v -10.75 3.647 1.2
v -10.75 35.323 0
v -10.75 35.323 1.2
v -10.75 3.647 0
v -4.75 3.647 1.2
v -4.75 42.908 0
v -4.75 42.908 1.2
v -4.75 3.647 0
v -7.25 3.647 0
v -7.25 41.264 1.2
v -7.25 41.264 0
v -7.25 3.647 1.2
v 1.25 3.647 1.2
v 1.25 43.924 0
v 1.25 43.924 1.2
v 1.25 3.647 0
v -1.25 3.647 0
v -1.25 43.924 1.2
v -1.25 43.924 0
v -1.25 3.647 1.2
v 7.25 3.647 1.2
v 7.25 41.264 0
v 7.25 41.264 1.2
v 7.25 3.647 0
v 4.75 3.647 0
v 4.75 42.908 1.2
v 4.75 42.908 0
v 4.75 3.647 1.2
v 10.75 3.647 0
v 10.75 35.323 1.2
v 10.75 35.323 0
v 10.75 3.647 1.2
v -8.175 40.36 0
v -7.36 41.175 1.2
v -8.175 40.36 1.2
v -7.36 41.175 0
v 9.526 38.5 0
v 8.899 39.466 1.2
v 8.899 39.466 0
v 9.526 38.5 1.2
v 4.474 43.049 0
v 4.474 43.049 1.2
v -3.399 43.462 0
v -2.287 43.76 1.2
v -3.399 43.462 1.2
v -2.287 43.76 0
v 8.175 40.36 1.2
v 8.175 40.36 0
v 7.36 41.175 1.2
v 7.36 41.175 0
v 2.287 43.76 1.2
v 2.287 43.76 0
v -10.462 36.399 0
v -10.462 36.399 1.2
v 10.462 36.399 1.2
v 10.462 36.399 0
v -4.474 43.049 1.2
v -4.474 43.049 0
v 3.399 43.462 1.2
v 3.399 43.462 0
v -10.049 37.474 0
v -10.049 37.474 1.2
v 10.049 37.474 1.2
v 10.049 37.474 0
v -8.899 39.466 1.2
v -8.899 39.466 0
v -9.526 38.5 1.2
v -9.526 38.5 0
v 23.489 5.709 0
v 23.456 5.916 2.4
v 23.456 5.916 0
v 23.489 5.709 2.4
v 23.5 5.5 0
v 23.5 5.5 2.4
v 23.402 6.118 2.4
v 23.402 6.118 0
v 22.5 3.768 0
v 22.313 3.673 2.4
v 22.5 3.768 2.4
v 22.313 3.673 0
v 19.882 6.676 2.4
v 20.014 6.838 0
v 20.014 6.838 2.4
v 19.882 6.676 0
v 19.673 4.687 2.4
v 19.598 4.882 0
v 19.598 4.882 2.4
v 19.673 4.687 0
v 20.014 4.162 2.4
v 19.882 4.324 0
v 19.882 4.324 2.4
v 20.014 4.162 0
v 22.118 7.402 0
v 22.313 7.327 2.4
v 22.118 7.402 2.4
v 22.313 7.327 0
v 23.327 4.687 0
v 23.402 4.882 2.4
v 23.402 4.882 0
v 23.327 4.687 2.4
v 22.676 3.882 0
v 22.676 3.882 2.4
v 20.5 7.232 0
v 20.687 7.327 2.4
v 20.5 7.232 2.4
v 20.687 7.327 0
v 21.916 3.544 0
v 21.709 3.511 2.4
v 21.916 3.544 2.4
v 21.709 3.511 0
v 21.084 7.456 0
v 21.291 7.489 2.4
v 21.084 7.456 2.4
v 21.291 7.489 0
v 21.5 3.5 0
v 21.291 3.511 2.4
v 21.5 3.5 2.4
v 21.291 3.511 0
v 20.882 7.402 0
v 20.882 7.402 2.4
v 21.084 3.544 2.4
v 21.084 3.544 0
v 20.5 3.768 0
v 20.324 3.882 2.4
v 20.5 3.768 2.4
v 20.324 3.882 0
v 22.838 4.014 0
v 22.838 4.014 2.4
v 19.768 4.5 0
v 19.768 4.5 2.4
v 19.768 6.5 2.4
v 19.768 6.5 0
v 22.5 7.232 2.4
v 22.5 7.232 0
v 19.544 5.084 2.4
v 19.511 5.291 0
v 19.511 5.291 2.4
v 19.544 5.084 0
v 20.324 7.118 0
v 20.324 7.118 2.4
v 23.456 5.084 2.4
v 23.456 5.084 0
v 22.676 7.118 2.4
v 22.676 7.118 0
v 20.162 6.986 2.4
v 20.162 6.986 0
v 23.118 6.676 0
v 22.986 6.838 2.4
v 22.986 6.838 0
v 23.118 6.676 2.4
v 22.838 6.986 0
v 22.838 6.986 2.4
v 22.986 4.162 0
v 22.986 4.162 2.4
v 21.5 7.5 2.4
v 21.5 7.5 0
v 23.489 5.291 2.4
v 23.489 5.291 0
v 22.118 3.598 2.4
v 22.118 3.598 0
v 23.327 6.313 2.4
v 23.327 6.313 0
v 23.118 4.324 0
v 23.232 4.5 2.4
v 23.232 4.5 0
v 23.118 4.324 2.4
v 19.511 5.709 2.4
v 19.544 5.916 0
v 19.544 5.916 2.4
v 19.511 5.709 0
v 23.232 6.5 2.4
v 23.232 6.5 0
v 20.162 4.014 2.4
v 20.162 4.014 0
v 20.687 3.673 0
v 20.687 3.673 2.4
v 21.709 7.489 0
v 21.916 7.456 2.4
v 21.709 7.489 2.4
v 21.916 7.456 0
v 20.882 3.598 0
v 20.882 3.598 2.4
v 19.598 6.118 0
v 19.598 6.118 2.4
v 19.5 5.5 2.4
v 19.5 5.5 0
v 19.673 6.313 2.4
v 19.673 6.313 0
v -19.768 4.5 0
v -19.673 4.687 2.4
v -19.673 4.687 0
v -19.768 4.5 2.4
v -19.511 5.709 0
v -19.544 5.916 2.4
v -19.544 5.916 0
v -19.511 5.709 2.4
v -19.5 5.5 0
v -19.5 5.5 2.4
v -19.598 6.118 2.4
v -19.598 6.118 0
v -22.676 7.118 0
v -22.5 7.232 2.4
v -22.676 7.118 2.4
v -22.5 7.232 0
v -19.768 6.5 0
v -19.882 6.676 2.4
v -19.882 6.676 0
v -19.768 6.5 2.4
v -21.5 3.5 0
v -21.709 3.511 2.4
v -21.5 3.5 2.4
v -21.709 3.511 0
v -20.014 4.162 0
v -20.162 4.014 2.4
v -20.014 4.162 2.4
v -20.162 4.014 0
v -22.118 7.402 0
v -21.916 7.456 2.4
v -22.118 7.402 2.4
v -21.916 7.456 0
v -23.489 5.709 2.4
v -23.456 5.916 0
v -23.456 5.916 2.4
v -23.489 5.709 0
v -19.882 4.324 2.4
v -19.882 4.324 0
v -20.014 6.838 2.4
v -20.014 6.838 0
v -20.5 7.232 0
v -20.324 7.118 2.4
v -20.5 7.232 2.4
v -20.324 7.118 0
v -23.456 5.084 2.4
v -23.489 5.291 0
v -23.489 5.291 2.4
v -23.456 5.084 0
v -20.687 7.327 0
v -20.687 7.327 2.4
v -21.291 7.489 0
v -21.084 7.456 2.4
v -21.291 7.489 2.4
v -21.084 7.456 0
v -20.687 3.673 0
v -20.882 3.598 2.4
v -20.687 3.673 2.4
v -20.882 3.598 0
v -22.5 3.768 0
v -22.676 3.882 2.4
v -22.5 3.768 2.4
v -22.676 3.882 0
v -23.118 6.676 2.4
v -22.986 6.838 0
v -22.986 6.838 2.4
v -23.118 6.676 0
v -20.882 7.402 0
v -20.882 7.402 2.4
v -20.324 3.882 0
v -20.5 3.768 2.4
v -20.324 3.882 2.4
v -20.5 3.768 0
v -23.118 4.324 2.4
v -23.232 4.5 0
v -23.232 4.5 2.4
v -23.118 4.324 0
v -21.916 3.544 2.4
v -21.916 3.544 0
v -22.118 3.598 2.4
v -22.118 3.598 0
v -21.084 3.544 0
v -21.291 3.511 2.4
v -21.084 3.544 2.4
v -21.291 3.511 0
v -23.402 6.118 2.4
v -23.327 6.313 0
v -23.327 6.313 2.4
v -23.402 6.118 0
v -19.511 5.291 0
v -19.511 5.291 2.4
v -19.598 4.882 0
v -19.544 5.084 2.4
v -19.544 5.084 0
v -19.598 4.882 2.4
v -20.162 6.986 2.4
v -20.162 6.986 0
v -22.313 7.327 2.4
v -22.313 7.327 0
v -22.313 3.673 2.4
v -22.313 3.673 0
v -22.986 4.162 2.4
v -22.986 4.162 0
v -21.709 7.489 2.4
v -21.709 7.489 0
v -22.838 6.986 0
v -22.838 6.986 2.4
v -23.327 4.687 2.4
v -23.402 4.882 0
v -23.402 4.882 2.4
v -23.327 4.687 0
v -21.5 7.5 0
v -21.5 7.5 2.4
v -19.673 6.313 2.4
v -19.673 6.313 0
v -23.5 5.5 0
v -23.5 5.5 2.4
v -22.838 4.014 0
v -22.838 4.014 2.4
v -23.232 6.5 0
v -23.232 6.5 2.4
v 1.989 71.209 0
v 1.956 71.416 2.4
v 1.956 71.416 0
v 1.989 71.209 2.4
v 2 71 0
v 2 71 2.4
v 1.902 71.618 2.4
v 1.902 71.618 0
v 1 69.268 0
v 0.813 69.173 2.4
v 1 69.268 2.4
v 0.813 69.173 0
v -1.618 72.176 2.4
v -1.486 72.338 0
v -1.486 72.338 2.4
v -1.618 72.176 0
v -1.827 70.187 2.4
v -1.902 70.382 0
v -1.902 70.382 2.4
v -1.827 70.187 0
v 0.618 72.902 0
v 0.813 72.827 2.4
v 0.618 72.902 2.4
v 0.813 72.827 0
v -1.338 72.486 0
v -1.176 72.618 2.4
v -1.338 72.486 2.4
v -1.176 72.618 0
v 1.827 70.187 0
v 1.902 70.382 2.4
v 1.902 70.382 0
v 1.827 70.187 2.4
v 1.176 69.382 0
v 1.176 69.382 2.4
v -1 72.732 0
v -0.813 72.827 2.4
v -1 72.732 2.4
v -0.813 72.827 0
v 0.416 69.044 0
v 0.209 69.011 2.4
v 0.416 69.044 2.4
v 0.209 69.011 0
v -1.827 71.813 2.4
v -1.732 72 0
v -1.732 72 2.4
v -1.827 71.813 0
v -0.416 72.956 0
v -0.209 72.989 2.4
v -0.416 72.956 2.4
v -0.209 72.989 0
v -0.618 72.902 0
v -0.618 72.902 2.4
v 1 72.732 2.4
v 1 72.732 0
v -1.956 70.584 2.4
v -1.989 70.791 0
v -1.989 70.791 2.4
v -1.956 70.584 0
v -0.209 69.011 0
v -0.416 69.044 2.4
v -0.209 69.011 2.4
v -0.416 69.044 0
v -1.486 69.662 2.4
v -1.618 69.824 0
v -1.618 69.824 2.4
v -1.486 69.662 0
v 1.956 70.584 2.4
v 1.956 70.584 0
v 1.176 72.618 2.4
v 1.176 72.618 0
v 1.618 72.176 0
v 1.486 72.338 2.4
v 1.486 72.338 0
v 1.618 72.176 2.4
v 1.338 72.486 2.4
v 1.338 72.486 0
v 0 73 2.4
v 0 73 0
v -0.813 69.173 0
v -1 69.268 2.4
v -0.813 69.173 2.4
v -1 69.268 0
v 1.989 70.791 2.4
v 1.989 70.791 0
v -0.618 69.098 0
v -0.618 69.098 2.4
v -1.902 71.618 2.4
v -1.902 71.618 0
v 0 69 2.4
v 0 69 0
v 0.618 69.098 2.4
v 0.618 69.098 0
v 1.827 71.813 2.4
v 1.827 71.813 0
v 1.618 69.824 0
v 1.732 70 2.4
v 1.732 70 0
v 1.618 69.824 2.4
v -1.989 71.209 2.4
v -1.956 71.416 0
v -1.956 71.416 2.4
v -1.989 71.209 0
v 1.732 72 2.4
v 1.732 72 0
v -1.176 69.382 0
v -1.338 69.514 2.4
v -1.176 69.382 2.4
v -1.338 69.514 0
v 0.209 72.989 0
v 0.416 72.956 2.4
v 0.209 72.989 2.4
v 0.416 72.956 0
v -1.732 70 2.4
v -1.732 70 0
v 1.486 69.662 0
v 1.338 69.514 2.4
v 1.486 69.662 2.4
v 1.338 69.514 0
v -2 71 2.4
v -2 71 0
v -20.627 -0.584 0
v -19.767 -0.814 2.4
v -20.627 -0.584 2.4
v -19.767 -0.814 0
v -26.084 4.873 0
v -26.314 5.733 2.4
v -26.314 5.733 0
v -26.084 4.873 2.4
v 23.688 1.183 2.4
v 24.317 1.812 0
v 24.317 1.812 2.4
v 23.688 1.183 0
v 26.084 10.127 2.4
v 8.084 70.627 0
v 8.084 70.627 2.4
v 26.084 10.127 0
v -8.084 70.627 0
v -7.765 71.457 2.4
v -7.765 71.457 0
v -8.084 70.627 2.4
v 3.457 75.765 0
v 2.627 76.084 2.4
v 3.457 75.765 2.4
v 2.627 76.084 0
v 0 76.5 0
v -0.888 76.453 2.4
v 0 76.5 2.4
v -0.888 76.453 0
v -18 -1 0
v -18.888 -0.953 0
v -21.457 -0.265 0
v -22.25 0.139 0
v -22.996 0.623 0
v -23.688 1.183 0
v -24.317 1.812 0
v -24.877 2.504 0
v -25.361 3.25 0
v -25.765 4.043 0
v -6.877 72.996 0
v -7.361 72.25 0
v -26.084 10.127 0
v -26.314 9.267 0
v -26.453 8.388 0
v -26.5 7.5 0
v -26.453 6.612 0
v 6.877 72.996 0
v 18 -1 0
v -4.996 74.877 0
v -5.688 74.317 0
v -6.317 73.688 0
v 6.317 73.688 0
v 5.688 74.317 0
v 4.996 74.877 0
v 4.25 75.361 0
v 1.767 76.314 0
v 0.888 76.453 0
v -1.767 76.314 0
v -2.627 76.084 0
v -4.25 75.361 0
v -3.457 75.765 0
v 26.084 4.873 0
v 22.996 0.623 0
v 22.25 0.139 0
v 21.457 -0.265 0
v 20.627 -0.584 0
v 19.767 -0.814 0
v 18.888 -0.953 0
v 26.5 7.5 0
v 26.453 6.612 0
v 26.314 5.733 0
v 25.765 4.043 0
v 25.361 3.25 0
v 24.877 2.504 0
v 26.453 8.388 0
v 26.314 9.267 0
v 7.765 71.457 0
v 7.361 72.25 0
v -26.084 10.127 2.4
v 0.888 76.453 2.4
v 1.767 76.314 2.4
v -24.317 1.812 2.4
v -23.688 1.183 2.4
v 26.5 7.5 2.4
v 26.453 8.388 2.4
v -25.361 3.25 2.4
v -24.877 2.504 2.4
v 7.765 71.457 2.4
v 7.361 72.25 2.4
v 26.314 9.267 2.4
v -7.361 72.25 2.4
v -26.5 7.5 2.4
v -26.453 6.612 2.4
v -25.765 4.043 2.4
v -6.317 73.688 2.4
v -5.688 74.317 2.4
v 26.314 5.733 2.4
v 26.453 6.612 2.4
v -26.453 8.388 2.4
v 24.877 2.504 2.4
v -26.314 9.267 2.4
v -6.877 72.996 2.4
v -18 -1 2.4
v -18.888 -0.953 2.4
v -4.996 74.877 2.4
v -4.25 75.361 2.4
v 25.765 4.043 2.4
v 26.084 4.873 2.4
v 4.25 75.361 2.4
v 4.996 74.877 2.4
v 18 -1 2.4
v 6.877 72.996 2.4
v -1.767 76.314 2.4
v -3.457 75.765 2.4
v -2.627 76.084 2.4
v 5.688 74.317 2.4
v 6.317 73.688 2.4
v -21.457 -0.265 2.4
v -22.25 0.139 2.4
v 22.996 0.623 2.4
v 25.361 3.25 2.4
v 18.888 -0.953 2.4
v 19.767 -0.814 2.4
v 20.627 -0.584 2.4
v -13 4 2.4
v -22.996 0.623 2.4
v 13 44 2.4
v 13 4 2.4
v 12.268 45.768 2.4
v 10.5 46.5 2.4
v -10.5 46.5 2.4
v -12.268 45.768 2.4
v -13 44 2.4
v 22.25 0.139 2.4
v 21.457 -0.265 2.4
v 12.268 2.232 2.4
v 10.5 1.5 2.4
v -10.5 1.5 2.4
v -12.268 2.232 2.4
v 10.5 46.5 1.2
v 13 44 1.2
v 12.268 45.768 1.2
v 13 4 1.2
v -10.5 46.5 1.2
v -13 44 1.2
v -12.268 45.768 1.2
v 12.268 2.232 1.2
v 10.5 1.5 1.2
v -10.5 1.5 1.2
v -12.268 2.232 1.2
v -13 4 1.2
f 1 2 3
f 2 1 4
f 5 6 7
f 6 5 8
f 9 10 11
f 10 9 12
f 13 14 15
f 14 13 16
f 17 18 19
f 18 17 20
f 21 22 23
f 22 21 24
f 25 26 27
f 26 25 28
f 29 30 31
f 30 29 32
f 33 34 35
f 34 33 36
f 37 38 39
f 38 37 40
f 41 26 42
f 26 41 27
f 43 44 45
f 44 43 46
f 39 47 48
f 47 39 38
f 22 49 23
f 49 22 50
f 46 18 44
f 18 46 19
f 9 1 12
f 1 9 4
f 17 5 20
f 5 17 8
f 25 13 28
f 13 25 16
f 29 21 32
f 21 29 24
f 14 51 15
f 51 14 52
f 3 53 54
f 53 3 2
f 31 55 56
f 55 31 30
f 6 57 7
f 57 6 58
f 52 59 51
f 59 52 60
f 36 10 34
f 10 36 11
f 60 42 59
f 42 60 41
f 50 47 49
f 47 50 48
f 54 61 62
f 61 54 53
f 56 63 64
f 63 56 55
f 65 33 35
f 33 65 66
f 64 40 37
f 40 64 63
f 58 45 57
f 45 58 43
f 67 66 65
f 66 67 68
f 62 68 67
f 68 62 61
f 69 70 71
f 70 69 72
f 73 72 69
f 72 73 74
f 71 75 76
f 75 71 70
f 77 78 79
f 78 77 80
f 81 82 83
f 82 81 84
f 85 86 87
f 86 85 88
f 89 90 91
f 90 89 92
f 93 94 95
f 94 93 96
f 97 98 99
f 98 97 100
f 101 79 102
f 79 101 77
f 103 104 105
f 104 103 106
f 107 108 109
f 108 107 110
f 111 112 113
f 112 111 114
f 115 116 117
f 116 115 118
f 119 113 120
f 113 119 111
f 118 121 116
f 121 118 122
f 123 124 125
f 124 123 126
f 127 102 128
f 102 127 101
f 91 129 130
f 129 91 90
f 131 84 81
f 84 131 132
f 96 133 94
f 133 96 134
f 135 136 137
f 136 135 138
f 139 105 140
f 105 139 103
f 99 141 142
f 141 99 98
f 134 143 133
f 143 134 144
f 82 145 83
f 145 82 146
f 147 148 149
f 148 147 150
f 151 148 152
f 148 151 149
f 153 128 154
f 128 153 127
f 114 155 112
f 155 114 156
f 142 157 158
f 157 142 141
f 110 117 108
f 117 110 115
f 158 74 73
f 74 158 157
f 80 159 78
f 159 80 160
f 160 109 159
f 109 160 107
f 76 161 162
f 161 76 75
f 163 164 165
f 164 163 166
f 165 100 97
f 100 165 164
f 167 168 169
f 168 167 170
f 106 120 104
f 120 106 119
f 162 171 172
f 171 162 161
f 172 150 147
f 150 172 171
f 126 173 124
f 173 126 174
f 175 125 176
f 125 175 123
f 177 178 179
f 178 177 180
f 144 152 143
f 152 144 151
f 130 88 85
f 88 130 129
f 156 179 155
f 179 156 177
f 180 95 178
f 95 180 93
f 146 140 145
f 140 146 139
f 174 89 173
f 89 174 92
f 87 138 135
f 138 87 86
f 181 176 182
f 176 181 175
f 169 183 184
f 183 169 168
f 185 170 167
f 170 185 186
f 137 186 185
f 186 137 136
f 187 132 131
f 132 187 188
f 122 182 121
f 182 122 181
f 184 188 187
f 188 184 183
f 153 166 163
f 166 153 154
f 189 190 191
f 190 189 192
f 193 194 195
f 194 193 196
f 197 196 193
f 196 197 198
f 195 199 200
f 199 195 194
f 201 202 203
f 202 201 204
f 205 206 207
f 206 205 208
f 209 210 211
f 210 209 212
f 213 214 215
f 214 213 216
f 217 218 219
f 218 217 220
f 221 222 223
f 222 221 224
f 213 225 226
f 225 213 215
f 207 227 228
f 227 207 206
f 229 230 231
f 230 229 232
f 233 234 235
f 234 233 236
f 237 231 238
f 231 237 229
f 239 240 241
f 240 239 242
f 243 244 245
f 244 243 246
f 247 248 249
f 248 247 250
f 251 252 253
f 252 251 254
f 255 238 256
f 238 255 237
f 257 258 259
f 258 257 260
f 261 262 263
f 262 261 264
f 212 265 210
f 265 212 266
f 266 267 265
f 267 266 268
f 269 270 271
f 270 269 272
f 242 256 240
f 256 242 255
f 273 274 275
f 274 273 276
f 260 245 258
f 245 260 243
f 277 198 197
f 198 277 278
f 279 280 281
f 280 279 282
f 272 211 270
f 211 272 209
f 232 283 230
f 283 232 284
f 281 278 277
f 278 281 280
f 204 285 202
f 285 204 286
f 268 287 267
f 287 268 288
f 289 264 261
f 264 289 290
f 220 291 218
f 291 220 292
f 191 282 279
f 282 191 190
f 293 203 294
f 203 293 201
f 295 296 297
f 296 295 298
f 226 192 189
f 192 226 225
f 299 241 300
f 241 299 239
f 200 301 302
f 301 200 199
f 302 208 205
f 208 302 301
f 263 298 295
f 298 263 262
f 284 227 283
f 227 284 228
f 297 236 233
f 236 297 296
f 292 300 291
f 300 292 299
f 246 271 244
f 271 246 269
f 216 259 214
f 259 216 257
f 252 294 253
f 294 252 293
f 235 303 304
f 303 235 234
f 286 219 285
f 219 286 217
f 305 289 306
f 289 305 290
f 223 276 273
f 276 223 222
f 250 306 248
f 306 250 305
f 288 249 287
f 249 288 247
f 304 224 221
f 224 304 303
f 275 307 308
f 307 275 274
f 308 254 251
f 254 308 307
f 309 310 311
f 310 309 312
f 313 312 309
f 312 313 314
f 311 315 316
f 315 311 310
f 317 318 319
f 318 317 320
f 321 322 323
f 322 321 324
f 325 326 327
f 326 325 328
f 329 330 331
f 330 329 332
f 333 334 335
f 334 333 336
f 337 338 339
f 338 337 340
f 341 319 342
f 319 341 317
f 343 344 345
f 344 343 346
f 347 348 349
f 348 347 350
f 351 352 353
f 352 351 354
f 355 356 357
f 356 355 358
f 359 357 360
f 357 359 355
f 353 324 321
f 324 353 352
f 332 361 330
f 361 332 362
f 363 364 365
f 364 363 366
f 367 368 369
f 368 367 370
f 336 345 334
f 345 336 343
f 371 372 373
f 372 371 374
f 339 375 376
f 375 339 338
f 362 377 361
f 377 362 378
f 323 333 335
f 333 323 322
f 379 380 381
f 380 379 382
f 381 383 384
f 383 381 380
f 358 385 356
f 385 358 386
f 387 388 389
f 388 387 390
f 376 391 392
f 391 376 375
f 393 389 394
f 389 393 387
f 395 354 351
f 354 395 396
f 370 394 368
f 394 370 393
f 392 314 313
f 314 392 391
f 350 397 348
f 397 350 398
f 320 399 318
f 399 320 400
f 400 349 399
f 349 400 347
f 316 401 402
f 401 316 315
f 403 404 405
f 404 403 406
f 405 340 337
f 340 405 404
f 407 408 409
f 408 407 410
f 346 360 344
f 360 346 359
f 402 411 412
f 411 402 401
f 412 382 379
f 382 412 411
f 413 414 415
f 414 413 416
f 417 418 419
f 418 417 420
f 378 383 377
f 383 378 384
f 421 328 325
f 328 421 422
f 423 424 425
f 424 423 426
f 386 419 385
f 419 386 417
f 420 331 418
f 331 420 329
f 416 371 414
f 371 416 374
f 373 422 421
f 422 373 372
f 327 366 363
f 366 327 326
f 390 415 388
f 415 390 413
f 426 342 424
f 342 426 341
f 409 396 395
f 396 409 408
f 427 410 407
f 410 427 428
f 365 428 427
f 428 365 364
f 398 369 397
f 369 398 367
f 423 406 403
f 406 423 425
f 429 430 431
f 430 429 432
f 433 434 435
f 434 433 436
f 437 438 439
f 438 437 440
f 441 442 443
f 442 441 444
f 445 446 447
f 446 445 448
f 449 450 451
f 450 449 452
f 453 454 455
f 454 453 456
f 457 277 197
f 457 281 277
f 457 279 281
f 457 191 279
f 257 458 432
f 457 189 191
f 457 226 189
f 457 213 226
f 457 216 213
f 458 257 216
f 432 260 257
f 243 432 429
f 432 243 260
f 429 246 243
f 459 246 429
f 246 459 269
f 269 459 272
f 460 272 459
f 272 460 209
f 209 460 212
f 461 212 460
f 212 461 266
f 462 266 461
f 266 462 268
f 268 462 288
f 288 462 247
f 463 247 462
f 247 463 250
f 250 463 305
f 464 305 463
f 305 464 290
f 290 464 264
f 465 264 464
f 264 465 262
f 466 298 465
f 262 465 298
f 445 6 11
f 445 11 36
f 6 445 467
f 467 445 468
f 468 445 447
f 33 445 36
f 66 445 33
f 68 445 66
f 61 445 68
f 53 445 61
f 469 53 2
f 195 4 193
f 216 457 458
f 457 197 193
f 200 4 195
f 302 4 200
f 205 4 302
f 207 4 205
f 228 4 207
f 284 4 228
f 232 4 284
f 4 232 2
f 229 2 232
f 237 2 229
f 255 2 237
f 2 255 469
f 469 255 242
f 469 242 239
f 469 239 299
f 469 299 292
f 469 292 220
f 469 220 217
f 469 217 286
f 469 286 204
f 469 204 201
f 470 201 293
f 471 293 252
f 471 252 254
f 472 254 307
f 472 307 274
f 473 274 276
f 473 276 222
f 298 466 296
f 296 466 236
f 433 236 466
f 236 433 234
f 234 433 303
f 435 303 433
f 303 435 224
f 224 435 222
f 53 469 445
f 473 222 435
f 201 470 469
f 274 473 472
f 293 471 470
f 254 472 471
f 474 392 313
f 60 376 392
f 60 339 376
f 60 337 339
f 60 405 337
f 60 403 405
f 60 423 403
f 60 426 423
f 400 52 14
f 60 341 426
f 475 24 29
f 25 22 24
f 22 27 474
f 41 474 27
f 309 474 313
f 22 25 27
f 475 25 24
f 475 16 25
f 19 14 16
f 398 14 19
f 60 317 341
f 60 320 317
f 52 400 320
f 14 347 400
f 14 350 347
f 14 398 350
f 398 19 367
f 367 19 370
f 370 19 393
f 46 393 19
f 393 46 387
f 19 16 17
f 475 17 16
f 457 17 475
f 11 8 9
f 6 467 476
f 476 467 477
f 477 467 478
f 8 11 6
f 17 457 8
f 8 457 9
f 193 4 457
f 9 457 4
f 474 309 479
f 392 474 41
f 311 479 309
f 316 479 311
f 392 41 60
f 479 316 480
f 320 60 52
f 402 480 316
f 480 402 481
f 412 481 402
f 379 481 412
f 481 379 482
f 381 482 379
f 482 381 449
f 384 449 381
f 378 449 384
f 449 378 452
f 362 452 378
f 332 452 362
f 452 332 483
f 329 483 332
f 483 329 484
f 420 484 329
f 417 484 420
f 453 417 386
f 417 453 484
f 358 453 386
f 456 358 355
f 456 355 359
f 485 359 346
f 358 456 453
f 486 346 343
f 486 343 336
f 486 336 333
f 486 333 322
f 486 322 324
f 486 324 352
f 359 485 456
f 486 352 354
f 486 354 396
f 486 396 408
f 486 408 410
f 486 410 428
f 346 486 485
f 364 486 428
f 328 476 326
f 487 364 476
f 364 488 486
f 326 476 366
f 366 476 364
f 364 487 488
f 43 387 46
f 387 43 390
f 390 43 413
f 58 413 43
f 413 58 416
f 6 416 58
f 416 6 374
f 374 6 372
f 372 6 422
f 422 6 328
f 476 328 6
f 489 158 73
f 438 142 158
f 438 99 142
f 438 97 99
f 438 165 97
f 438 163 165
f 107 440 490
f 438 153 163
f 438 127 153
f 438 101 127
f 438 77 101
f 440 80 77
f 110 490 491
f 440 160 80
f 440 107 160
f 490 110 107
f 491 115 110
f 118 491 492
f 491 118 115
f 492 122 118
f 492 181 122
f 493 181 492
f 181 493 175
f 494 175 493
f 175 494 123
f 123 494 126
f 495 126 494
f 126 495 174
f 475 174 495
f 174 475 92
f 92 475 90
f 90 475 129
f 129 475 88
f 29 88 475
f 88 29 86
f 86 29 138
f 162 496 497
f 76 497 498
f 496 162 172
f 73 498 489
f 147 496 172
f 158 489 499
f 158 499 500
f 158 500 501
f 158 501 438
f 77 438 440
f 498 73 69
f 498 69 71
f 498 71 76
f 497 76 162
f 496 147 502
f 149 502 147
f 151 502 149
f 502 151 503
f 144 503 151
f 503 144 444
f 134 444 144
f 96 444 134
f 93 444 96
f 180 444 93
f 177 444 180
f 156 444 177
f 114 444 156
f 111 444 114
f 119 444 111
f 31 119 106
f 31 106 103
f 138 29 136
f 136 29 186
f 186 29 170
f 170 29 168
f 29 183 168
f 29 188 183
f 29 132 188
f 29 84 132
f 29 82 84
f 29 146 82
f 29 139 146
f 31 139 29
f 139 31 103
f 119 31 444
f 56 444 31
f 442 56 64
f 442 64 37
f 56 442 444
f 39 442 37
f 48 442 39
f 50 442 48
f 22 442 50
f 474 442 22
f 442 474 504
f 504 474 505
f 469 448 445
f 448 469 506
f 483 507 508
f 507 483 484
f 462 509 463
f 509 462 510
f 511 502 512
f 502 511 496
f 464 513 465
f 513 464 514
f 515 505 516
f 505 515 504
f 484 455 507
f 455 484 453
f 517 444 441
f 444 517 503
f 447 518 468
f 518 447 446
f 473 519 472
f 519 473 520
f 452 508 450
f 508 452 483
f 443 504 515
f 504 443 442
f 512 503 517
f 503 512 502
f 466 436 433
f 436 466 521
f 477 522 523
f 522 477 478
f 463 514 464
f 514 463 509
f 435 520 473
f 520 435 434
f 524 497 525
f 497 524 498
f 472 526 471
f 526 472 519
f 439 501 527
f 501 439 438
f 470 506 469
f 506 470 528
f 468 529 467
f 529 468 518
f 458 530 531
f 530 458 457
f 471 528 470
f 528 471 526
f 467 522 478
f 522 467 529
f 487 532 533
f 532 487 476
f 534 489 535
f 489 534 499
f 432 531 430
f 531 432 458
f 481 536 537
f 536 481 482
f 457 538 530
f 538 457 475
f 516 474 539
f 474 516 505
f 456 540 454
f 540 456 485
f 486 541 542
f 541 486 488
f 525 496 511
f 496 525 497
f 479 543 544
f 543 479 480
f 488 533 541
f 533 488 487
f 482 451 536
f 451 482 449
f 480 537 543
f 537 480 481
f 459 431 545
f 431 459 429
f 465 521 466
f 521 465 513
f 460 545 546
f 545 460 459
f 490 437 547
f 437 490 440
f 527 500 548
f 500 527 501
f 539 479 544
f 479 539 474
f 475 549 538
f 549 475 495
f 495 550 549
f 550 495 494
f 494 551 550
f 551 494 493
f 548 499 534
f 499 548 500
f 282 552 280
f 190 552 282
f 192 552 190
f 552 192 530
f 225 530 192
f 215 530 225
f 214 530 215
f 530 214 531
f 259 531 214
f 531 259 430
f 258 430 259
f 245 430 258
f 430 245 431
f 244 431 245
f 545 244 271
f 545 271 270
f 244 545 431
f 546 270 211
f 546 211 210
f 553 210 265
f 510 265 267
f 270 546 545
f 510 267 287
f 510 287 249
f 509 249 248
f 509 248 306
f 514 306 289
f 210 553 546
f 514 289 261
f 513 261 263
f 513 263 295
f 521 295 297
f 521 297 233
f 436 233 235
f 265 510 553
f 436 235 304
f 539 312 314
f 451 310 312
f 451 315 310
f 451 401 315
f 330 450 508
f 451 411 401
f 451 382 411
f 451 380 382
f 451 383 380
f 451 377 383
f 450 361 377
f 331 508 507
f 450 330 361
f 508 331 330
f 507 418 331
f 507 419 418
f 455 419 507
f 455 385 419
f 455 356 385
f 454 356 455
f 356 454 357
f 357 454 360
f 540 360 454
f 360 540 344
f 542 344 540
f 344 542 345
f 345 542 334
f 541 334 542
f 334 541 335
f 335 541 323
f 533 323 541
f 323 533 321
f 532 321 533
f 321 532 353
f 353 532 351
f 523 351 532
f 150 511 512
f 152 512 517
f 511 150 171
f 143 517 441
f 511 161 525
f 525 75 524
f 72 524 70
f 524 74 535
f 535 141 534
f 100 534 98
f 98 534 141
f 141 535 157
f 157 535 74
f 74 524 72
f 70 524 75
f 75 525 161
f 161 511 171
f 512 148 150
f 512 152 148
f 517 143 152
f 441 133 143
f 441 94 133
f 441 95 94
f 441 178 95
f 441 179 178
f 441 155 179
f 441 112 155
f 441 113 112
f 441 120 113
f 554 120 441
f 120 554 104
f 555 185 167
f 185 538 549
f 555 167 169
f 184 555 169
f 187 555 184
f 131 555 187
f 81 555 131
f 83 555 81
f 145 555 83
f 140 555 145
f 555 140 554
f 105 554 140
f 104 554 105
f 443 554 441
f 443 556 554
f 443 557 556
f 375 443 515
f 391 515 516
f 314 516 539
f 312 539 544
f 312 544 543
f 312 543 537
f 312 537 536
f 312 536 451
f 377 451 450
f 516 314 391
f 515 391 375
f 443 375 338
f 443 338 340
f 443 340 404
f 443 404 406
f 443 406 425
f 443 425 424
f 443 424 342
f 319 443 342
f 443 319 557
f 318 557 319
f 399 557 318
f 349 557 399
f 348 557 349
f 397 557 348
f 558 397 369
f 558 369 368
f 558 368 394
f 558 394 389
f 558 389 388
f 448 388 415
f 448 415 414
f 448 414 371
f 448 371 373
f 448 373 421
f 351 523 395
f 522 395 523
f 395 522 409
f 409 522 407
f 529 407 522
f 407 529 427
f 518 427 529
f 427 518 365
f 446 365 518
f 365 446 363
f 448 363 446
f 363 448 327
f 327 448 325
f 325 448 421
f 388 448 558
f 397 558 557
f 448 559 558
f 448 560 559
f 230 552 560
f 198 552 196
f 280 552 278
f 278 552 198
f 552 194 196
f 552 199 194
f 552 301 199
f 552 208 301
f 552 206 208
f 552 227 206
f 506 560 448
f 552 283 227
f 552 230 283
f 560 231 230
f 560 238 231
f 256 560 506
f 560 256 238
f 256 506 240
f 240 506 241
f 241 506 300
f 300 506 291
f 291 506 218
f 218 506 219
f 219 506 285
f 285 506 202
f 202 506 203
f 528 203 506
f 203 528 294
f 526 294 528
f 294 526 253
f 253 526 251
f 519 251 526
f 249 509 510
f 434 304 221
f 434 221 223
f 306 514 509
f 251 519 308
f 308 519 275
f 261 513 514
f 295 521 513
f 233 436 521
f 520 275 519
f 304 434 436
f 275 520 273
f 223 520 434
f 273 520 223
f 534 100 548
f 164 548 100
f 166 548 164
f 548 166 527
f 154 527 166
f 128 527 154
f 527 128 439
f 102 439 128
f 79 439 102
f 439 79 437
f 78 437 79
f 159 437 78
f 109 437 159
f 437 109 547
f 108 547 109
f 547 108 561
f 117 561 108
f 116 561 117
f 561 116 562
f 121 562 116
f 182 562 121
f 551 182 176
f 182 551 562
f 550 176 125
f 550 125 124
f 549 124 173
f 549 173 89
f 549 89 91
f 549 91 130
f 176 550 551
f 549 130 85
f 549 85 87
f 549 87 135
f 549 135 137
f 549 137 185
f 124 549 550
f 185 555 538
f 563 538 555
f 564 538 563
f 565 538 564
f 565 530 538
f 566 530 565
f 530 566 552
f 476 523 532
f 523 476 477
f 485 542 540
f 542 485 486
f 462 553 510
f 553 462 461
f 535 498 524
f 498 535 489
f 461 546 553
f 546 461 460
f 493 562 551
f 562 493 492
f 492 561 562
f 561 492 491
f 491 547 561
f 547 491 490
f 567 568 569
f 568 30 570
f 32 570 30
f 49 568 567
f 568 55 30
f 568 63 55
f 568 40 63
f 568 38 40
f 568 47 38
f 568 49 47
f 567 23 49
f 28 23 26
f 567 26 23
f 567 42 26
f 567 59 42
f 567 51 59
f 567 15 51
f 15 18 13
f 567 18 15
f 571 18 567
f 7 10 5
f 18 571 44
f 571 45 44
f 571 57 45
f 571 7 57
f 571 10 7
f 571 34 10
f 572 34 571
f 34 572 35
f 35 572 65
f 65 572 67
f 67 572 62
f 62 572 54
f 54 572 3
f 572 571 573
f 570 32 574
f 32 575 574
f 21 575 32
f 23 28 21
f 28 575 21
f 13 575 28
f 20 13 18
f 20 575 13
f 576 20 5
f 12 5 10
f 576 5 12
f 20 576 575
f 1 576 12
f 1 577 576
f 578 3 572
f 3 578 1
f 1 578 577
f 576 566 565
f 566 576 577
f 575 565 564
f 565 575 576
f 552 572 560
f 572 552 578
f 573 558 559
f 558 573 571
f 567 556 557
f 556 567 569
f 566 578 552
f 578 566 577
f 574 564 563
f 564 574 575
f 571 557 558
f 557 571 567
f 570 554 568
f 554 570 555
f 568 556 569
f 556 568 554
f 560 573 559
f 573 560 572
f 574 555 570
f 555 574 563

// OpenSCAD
// file: myshapes.scad
 /*
  * Copyright [2017] [Saul Castro]

    Licensed under the Apache License, Version 2.0 (the "License");
    you may not use this file except in compliance with the License.
    You may obtain a copy of the License at
    
        http://www.apache.org/licenses/LICENSE-2.0
    
    Unless required by applicable law or agreed to in writing, software
    distributed under the License is distributed on an "AS IS" BASIS,
    WITHOUT WARRANTIES OR CONDITIONS OF ANY KIND, either express or implied.
    See the License for the specific language governing permissions and
    limitations under the License.

  */
  
  
/*==================================================
==================	Extention of basic shape with shot sintax =====================
==================================================*/
//all shapes centered at 0, 0 for easy rotation

// r prefix rounded
//rrc(10, 20 ,30, 4, 5);

fn = 50;

module c(w, l, d){
    translate([0,0,0]) cube([w, l, d], center=true);
}

module cy(d, h){  
    translate([0,0,0])    cylinder(d=d, h=h, $fn=fn, center=true);
}
module cy(d, h, f){  
    translate([0,0,0])    cylinder(d=d, h=h, $fn=f, center=true);
}

module sp(d, f){  
    translate([0,0,0])    sphere(d=d, $fn=f, center=true);
}

module rcy(d, h, c, fn){
	minkowski(){
			sp(c);
			cy(d-c, h-c, fn);
        }
}

module rc(w, l, d, c){
    hull(){
            translate([w/2-c/2,l/2-c/2,0]) cy(c, d);
            translate([w/2-c/2,-l/2+c/2,0]) cy(c, d);
            translate([-(w/2-c/2),l/2-c/2,0]) cy(c, d);
            translate([-(w/2-c/2),-l/2+c/2,0]) cy(c, d);
    }
    
}

module rrc(w, h, d, c, s){
          translate([0,0,0])  minkowski(){
			sp(s);
			rc(w-s, h-s, d-s, c);
        }
}



module slot(d, l, h){
    hull(){
         translate([0,l/2-d/2,0]) cy(d, h);
            translate([0,-l/2+d/2,0]) cy(d, h);
    }
    
}
// main file
use <myshapes.scad> 
 
fn = 60;
 h = 28.5; 
 w = 50;  
 l = 80;  //vertical length
  ll = 4;  //chin offset
  lf = 6; //chin cutout?
  tz = 7; //vertical offset
  
  l2 = l - 9; //print face
  w2 = w - 7;   //print face
  
  //nearly rectanular cutout for efficient filter use.
  gd = 22; //cutout width
  gg = gd+ 4; //low cutout addtion
  
  oc = 19;  //outter coner
  ic = 17; //inner corner
  
  t = 11;    //lowwer negative taper
  tt = 7;   //upper positive center taper
  
  
 wall = 1.2*2;
 fwall = 1.2*1;
 
hole = 4;
hs = 11;  //hole suppport
hh = 8;     //hole height

//color("black") translate([0, 0, -4])     
screen();
//color("white") translate([0, 0, 11])     screen();


//%cy(111, 200, fn); //test volume //delta

//translate([80, 90, 11]) 
//%c(250, 210, fn); //test volume pi3//
//translate([80, 90, 11]) 
//%c(200, 200, fn); //test volume pi3


//for(j=[0:1]) 
//for(i=[0:1]) 
//    translate([90*i+45*j, j*148, 0]) 
//    rotate([0,0,j*180])
//mask();

module mask(){ 
    difference(){ 
        //outside
      out();
    
        //inside 
    difference(){ 
        in();
        sup();
    }
        
    
    //chin cutout
        translate([0,-1, 180])  rotate([90,0,0])   
        rotate([0,0,180/fn]) cy(311, 11, fn);
    
    
    //face cutouts
    //    grid();               //vertical screen
    vc();                   //v  screen
    //gc();                 //open cut
   // translate([0,0, 2])  //no outside holes.
    holes();
    translate([0,5+1.2,7]) rotate([90,0,0]) sidecut();
        
    //top cutoff
        translate([0,0, h*1.5])  cy(211, h ,50);
        
    }
}

module in(){
      union(){
        hull(){
        translate([0,0, fwall]) base(w-t-wall, l-t-wall, 2, ic); 
      //  translate([0,0, 4]) base(w-wall, l-wall, 2, ic); 
        translate([0,0, h-tz]) base(w-wall, l-wall, 2, ic);  
        }
    
       difference(){
        hull(){
             
        translate([0,l+7, h+11]) sp(ic, fn);
        translate([0,4, h+2])  rotate([0,90,0])  cy(ic, 1, fn);
            
        translate([0,0, h-1]) base(w+tt-wall, l-wall, 2, ic); 
        translate([0,0, h-tz]) base(w-wall, l-wall, 2, ic); 
        }
             translate([0, -oc+11, h-11])   rotate([0,90,0])  cy(oc, l, fn);
    }
    }
}


module out(){

  union(){
        hull(){
        translate([0,0, 0]) base(w-t, l-t, 2, oc);  
        translate([0,0, h-tz]) base(w, l, 2, oc);  
             translate([0, -ll, h-lf])   rotate([0,90,0])  cy(3, 22, fn);
        } 
        hull(){
        translate([0,0, h-2]) base(w+tt, l, 2, oc); 
        translate([0,0, h-tz]) base(w, l, 2, oc); 
             translate([0, -ll, h-lf])   rotate([0,90,0])  cy(3, 22, fn);
             
        }
    }
}

//---------------------------------------------------
// --------------- screen ---------------------------
    
module screen(){
    
    difference(){ 
        union(){
           translate([0, -1, 0]) base(w2-7, l2-5, fwall*2, ic);
            //sup();
        }
       
           translate([0, 24, h/2+fwall]) rc(gg, 45, h, 5);
        grid();
    holes();
    }
}

module grid(){
    difference(){
        gc();
    n = 2;
//  for(j=[-1,1]) rotate([0,0, j*11]) translate([0, 28])  c(3, 66, h);
  for(j=[-n:n]) rotate([0,0, 0]) translate([j*6, 28])  c(2.5, 66, h);
  }
}

module vc(){
    difference(){
        gc(); 
  for(j=[-1,1]) rotate([0,0, j*11]) translate([0, 28])  c(3, 66, h);
   }
}
module gc(){
    
    hull(){
         translate([0, 33, 0])  cy(gd, h, fn);
         translate([0, 7, 0]) rc(gg, 7, h, 6);
    } 
}


//---------------------------------------------------

module holes(){
    union(){
    for(i=pos(w2, l2, ll)) 
        translate([0,0, h/2])
        translate(i) cy(hole, h+1, fn);
    }
}

module sup(){
    union(){
    for(i=pos(w2, l2, ll)) 
        translate([0,0, -h/2+hh])
        translate(i) cy(hs, h, fn);
    }
}

function pos(w, l, ll) = [ [w/2, hs/2, 0], [-w/2, hs/2, 0], [0, l, 0] ];


module base(w, l, h, c){
    hull(){
    for(i=pos(w, l, ll)) 
        translate([0,3, h/2])
        translate(i) cy(c, h, fn);
    }
    
}

//---------------------------------------------------

module sidecut(){
    
    x = 13;
    y = 5;
    t = 11;
    n = 1;
        for(i=[-n:n])                                   //   d, h, c, fn
         translate([x*i,0, h/2-2])      rotate([0,0,90])  rcy(t, 7, 2 ,3);
        for(i=[-n:0])  
            translate([x*i+x/2,y, h/2-2]) rotate([0,0,-90])  rcy(t, 7, 2 ,3);
        

}
    
 
 
    
 
